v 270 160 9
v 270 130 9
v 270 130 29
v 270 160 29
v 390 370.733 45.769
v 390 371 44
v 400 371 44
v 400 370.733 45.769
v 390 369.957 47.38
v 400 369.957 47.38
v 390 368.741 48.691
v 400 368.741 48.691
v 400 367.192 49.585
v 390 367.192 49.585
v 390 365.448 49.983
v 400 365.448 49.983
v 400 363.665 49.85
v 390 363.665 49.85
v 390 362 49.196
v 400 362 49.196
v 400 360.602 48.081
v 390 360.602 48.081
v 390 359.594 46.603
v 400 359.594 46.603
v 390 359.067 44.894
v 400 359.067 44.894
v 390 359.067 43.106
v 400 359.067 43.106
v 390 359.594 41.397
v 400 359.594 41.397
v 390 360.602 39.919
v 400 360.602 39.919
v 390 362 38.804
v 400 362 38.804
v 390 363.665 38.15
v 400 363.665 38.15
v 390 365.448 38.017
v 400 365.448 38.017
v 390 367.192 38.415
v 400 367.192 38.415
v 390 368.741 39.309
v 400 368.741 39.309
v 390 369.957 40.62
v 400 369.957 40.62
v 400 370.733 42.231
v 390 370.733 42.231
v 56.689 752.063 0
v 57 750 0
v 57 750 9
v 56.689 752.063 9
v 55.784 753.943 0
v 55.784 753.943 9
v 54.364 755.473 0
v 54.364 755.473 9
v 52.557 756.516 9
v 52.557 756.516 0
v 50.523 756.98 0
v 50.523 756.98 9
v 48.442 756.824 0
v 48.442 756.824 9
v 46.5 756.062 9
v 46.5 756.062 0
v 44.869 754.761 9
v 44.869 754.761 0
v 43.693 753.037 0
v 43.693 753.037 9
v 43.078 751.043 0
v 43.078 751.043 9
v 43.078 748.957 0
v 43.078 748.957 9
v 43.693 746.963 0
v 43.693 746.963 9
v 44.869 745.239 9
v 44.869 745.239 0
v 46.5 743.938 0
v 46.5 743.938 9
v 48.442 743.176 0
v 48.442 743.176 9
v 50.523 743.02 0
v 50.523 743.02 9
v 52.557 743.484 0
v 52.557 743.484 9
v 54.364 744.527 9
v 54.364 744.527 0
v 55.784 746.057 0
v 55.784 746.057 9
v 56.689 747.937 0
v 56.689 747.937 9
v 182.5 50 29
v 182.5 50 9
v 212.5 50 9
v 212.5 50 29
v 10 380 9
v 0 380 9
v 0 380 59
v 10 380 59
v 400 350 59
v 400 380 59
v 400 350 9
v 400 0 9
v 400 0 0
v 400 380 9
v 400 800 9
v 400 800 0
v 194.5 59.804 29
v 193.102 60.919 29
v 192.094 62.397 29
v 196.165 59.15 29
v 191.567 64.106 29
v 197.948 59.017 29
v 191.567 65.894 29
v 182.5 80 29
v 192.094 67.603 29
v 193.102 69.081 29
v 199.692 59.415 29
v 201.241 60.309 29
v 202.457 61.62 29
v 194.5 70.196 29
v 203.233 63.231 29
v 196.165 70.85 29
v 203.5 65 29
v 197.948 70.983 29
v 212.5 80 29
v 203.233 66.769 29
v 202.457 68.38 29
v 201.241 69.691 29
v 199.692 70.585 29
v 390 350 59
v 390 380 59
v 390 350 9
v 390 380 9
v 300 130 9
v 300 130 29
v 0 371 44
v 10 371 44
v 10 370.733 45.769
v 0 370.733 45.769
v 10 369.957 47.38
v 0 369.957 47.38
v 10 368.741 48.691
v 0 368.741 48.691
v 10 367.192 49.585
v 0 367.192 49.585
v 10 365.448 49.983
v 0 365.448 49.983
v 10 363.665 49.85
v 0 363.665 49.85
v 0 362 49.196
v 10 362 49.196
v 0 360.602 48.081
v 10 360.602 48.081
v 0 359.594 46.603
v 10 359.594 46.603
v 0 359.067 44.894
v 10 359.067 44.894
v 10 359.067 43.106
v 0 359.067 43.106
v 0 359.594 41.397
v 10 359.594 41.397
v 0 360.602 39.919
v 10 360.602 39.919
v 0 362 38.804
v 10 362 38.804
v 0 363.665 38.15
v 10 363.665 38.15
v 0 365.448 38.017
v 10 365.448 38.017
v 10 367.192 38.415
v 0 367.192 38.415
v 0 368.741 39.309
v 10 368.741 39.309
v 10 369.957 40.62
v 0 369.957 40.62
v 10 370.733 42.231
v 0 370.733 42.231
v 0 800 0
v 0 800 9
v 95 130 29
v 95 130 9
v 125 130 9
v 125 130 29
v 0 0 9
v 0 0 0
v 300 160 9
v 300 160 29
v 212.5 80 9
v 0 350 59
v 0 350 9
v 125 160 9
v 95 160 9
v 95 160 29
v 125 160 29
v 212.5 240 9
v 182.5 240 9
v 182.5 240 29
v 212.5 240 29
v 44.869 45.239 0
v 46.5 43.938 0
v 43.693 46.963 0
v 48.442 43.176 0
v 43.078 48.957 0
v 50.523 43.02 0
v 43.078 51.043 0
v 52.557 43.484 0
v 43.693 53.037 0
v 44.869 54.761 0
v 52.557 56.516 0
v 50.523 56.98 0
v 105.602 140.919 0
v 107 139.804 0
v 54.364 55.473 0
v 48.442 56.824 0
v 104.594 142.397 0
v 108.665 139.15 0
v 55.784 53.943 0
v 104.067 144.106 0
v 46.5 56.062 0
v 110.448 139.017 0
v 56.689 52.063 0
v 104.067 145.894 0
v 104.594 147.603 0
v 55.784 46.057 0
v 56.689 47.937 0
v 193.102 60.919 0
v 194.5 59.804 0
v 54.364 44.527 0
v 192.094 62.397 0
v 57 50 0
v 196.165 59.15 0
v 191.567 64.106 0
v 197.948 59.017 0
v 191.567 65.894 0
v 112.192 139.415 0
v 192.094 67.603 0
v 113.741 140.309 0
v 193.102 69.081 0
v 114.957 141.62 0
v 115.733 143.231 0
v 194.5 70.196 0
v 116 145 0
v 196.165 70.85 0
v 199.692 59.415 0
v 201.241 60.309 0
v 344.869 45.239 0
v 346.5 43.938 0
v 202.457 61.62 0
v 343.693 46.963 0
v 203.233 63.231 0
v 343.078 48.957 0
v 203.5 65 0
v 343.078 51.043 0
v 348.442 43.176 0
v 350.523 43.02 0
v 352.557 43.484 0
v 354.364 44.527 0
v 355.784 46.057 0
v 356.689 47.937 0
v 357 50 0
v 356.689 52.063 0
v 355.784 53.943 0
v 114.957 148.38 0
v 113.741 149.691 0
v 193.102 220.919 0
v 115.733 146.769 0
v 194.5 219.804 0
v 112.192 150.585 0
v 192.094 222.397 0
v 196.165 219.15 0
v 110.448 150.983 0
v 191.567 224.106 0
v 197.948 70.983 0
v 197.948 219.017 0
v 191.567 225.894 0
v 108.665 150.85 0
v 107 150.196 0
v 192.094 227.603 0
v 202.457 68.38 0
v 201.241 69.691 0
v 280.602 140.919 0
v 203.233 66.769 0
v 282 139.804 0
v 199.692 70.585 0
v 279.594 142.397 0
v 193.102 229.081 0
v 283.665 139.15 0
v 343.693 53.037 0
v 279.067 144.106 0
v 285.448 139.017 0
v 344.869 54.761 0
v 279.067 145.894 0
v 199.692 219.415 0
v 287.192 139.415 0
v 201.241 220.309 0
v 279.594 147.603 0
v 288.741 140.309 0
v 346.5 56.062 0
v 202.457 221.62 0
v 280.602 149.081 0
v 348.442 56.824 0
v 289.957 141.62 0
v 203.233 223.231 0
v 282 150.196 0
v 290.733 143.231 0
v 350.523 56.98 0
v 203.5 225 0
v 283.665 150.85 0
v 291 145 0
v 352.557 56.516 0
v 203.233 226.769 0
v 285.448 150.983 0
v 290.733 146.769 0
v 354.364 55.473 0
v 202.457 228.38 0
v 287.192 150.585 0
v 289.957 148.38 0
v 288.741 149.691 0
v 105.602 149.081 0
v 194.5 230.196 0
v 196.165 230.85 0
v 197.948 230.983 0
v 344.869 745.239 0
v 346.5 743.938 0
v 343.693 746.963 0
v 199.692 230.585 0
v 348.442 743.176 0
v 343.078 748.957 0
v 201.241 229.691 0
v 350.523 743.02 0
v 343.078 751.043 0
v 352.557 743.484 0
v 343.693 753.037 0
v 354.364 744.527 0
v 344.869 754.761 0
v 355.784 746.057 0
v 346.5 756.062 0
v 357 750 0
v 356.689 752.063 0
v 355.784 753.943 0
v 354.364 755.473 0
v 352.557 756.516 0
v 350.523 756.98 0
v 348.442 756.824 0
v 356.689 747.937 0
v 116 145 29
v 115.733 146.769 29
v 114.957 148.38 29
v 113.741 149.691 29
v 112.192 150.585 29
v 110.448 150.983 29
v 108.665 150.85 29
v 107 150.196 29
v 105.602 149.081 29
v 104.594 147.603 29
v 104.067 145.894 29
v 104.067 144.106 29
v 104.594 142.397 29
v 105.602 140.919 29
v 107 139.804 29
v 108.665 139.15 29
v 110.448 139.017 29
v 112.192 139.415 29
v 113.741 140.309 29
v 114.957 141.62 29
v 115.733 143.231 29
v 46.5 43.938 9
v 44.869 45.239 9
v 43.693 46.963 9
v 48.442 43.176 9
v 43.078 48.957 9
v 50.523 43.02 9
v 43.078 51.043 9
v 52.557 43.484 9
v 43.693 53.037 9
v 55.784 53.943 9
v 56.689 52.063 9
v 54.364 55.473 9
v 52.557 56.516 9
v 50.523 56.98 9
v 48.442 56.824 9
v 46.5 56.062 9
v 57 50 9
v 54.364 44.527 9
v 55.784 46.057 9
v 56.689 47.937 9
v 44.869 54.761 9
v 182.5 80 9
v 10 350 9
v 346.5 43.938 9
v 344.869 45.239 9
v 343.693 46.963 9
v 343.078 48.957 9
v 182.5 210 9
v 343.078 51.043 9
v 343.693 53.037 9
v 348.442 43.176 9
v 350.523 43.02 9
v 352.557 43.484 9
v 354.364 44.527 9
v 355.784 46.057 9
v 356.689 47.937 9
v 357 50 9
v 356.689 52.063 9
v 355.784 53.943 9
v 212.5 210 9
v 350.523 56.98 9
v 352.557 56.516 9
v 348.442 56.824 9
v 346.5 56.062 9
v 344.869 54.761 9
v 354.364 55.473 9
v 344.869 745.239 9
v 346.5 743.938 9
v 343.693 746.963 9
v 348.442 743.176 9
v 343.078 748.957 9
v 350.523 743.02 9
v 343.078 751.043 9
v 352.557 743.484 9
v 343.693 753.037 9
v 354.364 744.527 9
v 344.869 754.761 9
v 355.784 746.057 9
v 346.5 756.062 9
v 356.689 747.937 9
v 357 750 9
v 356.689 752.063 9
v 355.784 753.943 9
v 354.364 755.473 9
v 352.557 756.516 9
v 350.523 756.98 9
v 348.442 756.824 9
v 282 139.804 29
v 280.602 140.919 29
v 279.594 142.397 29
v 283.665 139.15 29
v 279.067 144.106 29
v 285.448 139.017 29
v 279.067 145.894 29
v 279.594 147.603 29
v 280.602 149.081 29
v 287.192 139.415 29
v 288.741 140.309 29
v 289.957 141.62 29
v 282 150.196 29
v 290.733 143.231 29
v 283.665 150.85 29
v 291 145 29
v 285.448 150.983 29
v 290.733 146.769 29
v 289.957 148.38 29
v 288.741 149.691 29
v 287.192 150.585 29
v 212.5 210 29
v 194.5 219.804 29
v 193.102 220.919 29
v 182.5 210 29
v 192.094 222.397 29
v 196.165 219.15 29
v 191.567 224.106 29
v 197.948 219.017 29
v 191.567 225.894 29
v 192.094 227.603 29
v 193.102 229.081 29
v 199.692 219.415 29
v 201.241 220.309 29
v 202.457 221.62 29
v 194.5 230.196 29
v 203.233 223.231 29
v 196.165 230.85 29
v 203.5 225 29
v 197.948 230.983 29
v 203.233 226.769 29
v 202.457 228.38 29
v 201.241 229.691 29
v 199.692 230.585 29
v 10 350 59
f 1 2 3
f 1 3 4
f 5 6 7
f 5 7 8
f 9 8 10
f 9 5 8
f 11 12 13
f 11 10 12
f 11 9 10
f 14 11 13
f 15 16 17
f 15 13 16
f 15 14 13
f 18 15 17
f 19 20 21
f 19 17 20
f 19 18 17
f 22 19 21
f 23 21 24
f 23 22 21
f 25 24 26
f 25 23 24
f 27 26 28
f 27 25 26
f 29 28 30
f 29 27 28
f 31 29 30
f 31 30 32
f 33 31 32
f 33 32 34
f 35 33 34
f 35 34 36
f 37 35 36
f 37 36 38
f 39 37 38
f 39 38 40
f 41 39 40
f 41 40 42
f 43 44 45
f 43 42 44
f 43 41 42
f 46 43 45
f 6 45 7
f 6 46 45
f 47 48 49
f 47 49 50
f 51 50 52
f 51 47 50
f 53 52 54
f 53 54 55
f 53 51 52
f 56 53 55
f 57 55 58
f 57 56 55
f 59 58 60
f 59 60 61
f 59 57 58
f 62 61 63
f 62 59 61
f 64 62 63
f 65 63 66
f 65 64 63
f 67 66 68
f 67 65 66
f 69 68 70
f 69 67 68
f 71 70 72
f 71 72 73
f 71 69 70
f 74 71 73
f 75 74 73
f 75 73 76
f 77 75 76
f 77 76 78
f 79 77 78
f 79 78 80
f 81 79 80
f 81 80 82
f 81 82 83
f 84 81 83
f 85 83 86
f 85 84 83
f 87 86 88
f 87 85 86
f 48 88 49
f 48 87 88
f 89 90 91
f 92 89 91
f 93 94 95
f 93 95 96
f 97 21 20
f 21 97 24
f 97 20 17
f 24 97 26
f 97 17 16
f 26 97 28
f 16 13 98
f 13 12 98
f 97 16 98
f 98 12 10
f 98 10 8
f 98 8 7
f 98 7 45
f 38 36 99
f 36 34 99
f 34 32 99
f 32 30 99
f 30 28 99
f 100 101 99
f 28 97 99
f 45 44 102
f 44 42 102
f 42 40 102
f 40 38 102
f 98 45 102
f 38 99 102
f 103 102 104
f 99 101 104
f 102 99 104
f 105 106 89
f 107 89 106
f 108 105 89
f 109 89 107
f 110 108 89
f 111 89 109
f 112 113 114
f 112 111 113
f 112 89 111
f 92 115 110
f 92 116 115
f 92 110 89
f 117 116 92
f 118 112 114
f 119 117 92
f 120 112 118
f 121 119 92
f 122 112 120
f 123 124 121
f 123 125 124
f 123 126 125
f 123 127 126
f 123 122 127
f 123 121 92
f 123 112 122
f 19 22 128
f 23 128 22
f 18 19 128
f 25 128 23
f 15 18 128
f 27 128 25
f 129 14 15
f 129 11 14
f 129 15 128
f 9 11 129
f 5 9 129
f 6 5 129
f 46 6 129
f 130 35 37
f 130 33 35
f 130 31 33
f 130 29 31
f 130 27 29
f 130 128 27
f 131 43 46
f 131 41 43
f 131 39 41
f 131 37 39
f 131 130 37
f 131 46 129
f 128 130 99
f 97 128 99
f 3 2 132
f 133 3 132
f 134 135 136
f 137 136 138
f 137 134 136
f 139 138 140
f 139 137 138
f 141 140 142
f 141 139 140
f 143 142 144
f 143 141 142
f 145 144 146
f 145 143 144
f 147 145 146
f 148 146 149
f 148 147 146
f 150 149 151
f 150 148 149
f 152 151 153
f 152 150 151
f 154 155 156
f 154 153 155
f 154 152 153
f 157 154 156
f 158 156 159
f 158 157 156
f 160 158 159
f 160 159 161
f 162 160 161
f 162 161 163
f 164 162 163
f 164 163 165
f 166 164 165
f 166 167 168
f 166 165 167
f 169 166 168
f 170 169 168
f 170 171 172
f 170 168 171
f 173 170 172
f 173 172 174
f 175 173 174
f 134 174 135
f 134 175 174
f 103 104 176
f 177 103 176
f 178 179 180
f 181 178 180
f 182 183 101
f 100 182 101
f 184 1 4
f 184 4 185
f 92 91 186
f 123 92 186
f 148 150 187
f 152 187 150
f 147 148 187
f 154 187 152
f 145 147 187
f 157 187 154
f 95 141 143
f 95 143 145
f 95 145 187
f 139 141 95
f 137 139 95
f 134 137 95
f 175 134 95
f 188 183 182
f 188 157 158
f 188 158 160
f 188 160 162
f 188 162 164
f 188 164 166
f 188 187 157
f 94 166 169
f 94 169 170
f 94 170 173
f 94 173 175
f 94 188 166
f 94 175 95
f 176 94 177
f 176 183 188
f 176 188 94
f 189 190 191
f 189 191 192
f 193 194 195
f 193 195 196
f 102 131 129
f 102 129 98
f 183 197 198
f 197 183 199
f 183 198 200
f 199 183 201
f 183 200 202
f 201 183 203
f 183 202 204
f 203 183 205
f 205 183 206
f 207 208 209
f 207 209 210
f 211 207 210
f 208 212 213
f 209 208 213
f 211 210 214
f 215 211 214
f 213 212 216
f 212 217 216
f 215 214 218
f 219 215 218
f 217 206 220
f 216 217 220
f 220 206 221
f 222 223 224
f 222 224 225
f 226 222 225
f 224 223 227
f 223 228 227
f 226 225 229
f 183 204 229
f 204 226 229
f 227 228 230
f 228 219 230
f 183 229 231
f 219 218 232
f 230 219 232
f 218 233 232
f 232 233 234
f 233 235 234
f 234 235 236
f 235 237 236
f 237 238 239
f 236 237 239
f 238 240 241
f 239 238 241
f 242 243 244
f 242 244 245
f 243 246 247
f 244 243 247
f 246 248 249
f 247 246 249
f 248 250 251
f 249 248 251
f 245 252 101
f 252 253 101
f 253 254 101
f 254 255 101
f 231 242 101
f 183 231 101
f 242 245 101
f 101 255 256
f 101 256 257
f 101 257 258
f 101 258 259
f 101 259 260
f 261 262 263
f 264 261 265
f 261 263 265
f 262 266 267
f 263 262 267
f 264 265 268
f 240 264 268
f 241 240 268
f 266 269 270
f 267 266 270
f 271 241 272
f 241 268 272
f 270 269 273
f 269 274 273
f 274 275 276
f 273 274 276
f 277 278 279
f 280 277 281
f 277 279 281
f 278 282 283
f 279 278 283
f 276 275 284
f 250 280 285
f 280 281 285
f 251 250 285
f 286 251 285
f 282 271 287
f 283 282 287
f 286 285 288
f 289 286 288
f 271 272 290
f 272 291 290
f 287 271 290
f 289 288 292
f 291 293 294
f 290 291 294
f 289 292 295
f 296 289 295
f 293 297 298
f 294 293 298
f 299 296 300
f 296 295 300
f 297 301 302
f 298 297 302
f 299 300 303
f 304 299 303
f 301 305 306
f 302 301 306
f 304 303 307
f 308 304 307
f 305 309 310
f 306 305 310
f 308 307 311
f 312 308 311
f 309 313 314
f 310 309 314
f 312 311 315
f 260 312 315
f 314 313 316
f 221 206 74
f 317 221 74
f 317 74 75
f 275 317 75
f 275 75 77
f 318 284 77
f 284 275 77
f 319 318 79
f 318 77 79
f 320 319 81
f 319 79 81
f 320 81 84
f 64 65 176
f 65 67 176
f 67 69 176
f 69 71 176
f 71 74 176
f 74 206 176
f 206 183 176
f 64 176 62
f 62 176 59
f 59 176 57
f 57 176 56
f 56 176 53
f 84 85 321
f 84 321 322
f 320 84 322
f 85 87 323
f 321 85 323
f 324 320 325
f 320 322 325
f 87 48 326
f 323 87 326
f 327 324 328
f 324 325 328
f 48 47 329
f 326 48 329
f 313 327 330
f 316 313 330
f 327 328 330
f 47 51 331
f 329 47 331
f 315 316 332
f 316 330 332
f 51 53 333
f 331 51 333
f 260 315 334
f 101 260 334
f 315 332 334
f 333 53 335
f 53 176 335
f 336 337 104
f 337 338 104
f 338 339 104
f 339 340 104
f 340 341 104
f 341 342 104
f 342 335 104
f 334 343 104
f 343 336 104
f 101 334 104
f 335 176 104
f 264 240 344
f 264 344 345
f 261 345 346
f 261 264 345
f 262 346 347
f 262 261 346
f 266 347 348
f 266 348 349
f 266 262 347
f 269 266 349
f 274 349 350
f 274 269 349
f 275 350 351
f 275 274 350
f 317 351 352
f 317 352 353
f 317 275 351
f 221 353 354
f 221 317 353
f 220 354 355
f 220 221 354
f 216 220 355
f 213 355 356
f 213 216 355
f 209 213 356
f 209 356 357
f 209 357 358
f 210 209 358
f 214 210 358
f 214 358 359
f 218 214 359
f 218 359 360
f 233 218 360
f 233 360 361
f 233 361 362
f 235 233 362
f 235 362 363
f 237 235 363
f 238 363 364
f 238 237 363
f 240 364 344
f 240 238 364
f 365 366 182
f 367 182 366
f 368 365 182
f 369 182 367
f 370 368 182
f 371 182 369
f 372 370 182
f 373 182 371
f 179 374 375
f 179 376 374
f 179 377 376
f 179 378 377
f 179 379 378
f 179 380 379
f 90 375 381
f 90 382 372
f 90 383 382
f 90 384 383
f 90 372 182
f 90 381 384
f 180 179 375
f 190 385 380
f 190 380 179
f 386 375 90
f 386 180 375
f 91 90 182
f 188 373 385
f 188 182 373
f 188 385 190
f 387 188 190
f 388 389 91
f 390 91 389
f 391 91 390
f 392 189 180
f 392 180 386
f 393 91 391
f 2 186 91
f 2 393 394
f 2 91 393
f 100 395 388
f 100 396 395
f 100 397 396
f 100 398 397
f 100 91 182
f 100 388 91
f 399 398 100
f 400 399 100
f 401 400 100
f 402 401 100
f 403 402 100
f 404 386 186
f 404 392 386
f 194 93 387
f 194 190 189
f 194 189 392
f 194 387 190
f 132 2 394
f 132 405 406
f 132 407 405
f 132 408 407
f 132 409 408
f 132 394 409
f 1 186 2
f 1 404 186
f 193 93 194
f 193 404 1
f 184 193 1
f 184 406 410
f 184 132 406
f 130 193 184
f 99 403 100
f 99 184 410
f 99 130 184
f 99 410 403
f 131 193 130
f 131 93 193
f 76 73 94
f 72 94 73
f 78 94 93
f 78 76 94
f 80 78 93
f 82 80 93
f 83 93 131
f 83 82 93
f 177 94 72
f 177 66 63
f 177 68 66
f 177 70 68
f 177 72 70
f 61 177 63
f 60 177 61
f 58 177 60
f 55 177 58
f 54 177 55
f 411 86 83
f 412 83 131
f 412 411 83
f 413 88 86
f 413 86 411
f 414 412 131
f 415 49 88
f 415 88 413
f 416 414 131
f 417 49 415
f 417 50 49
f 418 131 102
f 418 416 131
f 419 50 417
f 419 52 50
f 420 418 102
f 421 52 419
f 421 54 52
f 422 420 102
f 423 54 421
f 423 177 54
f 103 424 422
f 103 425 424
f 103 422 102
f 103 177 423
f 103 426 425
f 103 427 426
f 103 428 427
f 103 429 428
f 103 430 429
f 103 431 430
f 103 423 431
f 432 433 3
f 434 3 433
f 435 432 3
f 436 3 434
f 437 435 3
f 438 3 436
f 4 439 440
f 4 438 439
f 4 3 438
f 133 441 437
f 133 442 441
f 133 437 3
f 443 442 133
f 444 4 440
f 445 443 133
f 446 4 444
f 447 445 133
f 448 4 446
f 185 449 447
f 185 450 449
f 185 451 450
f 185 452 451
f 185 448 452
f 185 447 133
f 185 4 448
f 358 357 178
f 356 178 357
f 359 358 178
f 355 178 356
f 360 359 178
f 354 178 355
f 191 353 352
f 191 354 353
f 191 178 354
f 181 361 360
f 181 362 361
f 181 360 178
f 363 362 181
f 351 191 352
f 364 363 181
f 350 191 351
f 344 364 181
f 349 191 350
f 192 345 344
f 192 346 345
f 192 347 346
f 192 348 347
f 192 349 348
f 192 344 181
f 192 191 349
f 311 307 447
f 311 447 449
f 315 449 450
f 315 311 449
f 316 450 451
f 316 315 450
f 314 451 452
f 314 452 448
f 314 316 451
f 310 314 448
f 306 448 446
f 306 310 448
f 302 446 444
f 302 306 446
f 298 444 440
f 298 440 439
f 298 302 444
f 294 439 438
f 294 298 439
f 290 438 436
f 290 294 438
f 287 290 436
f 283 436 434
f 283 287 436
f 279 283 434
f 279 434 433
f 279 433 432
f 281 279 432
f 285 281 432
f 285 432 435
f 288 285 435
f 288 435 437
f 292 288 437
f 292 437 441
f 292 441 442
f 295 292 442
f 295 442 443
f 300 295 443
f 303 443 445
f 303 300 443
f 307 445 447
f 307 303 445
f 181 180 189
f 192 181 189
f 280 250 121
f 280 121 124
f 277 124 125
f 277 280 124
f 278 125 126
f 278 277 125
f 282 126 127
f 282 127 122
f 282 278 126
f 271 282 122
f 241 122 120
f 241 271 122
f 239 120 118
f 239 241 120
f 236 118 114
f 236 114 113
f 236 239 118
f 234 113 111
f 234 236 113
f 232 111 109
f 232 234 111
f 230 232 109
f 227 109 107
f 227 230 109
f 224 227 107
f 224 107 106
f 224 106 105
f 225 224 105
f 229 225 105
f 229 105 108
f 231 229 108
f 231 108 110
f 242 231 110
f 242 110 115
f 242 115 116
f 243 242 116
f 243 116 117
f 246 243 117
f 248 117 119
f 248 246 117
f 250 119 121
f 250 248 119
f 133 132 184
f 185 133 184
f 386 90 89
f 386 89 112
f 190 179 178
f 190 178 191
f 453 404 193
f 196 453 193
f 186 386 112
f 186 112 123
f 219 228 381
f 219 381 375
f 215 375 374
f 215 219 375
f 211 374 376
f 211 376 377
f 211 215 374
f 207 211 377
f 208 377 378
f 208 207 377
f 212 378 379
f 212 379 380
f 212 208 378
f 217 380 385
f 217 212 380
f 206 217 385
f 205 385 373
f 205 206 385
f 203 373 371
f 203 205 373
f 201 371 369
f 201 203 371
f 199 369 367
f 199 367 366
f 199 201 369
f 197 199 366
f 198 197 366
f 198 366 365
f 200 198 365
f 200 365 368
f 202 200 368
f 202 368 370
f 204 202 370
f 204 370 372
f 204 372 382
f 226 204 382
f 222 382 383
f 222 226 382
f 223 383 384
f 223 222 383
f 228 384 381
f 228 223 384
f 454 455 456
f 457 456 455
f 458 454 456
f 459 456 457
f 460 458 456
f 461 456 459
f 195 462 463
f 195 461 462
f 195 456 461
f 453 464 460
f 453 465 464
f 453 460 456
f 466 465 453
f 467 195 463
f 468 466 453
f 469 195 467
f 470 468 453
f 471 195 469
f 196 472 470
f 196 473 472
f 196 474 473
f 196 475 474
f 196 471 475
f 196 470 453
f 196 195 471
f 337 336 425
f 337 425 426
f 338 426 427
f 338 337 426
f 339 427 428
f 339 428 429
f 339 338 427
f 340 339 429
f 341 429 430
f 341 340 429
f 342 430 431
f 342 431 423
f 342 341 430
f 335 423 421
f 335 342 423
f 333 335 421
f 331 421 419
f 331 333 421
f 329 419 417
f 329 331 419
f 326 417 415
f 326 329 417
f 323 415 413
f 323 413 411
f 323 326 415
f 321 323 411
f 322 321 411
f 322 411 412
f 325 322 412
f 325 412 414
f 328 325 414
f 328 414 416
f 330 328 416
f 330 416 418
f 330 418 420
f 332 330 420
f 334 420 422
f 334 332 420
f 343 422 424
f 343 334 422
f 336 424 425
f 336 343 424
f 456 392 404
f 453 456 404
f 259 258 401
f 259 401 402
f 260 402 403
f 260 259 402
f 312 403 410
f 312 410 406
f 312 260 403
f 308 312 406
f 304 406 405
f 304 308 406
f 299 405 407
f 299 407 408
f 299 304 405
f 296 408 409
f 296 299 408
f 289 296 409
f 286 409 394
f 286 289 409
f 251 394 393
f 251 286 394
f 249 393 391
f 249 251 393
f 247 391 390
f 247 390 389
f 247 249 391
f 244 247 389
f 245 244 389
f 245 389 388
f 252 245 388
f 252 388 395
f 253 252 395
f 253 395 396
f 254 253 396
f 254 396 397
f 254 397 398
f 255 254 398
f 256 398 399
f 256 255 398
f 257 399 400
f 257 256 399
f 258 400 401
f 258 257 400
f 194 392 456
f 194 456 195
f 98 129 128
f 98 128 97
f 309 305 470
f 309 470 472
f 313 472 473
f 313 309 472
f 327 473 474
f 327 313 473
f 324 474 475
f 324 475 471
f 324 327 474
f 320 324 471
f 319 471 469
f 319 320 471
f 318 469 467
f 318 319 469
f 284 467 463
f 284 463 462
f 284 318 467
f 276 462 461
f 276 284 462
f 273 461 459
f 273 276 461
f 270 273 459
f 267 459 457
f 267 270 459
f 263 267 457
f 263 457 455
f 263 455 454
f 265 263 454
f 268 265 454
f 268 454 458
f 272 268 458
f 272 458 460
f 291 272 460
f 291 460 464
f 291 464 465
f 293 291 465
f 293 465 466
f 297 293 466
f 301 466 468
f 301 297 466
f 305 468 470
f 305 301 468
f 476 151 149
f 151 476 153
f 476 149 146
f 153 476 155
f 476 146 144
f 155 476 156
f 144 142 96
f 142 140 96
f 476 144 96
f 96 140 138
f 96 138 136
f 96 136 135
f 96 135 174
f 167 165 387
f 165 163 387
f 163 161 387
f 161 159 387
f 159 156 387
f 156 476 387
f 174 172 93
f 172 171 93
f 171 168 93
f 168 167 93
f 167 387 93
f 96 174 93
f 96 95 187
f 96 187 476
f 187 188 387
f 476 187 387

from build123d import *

# Parameters (mm, degrees)
F0_R     = 7
F0_W     = 30
F0_H     = 30
F1_DEPTH = 9
F0_R_2   = 6
F2_DEPTH = 29
F0_W_2   = 10
F3_DEPTH = 59
F4_R     = 6
F5_DEPTH = 486


with BuildPart() as f1:
    # F0 (on Top) → F1 (new body)
    with BuildSketch(Plane.XY):
        Polygon((0, 350), (0, 0), (400, 0), (400, 350), (390, 350), (390, 380), (400, 380), (400, 800), (0, 800), (0, 380), (10, 380), (10, 350), align=None)
        with Locations((50, 50)):
            Circle(F0_R, mode=Mode.SUBTRACT)
        with Locations((197.5, 65)):
            Rectangle(F0_W, F0_H, mode=Mode.SUBTRACT)
        with Locations((110, 145)):
            Rectangle(F0_W, F0_H, mode=Mode.SUBTRACT)
        with Locations((197.5, 225)):
            Rectangle(F0_W, F0_H, mode=Mode.SUBTRACT)
        with Locations((285, 145)):
            Rectangle(F0_W, F0_H, mode=Mode.SUBTRACT)
        with Locations((350, 50)):
            Circle(F0_R, mode=Mode.SUBTRACT)
        with Locations((50, 750)):
            Circle(F0_R, mode=Mode.SUBTRACT)
        with Locations((350, 750)):
            Circle(F0_R, mode=Mode.SUBTRACT)
    extrude(amount=F1_DEPTH)

    # F0 (on Top) → F2 (join)
    with BuildSketch(Plane.XY):
        with Locations((110, 145)):
            Rectangle(F0_W, F0_H)
        with Locations((110, 145)):
            Circle(F0_R_2, mode=Mode.SUBTRACT)
        with Locations((197.5, 225)):
            Rectangle(F0_W, F0_H)
        with Locations((197.5, 225)):
            Circle(F0_R_2, mode=Mode.SUBTRACT)
        with Locations((197.5, 65)):
            Rectangle(F0_W, F0_H)
        with Locations((197.5, 65)):
            Circle(F0_R_2, mode=Mode.SUBTRACT)
        with Locations((285, 145)):
            Rectangle(F0_W, F0_H)
        with Locations((285, 145)):
            Circle(F0_R_2, mode=Mode.SUBTRACT)
    extrude(amount=F2_DEPTH)

    # F0 (on Top) → F3 (join)
    with BuildSketch(Plane.XY):
        with Locations((5, 365)):
            Rectangle(F0_W_2, F0_H)
        with Locations((395, 365)):
            Rectangle(F0_W_2, F0_H)
    extrude(amount=F3_DEPTH)

    # F4 (on Right) → F5 (cut)
    with BuildSketch(Plane.YZ):
        with Locations((365, 44)):
            Circle(F4_R)
    extrude(amount=F5_DEPTH, mode=Mode.SUBTRACT)


solid = f1.part
